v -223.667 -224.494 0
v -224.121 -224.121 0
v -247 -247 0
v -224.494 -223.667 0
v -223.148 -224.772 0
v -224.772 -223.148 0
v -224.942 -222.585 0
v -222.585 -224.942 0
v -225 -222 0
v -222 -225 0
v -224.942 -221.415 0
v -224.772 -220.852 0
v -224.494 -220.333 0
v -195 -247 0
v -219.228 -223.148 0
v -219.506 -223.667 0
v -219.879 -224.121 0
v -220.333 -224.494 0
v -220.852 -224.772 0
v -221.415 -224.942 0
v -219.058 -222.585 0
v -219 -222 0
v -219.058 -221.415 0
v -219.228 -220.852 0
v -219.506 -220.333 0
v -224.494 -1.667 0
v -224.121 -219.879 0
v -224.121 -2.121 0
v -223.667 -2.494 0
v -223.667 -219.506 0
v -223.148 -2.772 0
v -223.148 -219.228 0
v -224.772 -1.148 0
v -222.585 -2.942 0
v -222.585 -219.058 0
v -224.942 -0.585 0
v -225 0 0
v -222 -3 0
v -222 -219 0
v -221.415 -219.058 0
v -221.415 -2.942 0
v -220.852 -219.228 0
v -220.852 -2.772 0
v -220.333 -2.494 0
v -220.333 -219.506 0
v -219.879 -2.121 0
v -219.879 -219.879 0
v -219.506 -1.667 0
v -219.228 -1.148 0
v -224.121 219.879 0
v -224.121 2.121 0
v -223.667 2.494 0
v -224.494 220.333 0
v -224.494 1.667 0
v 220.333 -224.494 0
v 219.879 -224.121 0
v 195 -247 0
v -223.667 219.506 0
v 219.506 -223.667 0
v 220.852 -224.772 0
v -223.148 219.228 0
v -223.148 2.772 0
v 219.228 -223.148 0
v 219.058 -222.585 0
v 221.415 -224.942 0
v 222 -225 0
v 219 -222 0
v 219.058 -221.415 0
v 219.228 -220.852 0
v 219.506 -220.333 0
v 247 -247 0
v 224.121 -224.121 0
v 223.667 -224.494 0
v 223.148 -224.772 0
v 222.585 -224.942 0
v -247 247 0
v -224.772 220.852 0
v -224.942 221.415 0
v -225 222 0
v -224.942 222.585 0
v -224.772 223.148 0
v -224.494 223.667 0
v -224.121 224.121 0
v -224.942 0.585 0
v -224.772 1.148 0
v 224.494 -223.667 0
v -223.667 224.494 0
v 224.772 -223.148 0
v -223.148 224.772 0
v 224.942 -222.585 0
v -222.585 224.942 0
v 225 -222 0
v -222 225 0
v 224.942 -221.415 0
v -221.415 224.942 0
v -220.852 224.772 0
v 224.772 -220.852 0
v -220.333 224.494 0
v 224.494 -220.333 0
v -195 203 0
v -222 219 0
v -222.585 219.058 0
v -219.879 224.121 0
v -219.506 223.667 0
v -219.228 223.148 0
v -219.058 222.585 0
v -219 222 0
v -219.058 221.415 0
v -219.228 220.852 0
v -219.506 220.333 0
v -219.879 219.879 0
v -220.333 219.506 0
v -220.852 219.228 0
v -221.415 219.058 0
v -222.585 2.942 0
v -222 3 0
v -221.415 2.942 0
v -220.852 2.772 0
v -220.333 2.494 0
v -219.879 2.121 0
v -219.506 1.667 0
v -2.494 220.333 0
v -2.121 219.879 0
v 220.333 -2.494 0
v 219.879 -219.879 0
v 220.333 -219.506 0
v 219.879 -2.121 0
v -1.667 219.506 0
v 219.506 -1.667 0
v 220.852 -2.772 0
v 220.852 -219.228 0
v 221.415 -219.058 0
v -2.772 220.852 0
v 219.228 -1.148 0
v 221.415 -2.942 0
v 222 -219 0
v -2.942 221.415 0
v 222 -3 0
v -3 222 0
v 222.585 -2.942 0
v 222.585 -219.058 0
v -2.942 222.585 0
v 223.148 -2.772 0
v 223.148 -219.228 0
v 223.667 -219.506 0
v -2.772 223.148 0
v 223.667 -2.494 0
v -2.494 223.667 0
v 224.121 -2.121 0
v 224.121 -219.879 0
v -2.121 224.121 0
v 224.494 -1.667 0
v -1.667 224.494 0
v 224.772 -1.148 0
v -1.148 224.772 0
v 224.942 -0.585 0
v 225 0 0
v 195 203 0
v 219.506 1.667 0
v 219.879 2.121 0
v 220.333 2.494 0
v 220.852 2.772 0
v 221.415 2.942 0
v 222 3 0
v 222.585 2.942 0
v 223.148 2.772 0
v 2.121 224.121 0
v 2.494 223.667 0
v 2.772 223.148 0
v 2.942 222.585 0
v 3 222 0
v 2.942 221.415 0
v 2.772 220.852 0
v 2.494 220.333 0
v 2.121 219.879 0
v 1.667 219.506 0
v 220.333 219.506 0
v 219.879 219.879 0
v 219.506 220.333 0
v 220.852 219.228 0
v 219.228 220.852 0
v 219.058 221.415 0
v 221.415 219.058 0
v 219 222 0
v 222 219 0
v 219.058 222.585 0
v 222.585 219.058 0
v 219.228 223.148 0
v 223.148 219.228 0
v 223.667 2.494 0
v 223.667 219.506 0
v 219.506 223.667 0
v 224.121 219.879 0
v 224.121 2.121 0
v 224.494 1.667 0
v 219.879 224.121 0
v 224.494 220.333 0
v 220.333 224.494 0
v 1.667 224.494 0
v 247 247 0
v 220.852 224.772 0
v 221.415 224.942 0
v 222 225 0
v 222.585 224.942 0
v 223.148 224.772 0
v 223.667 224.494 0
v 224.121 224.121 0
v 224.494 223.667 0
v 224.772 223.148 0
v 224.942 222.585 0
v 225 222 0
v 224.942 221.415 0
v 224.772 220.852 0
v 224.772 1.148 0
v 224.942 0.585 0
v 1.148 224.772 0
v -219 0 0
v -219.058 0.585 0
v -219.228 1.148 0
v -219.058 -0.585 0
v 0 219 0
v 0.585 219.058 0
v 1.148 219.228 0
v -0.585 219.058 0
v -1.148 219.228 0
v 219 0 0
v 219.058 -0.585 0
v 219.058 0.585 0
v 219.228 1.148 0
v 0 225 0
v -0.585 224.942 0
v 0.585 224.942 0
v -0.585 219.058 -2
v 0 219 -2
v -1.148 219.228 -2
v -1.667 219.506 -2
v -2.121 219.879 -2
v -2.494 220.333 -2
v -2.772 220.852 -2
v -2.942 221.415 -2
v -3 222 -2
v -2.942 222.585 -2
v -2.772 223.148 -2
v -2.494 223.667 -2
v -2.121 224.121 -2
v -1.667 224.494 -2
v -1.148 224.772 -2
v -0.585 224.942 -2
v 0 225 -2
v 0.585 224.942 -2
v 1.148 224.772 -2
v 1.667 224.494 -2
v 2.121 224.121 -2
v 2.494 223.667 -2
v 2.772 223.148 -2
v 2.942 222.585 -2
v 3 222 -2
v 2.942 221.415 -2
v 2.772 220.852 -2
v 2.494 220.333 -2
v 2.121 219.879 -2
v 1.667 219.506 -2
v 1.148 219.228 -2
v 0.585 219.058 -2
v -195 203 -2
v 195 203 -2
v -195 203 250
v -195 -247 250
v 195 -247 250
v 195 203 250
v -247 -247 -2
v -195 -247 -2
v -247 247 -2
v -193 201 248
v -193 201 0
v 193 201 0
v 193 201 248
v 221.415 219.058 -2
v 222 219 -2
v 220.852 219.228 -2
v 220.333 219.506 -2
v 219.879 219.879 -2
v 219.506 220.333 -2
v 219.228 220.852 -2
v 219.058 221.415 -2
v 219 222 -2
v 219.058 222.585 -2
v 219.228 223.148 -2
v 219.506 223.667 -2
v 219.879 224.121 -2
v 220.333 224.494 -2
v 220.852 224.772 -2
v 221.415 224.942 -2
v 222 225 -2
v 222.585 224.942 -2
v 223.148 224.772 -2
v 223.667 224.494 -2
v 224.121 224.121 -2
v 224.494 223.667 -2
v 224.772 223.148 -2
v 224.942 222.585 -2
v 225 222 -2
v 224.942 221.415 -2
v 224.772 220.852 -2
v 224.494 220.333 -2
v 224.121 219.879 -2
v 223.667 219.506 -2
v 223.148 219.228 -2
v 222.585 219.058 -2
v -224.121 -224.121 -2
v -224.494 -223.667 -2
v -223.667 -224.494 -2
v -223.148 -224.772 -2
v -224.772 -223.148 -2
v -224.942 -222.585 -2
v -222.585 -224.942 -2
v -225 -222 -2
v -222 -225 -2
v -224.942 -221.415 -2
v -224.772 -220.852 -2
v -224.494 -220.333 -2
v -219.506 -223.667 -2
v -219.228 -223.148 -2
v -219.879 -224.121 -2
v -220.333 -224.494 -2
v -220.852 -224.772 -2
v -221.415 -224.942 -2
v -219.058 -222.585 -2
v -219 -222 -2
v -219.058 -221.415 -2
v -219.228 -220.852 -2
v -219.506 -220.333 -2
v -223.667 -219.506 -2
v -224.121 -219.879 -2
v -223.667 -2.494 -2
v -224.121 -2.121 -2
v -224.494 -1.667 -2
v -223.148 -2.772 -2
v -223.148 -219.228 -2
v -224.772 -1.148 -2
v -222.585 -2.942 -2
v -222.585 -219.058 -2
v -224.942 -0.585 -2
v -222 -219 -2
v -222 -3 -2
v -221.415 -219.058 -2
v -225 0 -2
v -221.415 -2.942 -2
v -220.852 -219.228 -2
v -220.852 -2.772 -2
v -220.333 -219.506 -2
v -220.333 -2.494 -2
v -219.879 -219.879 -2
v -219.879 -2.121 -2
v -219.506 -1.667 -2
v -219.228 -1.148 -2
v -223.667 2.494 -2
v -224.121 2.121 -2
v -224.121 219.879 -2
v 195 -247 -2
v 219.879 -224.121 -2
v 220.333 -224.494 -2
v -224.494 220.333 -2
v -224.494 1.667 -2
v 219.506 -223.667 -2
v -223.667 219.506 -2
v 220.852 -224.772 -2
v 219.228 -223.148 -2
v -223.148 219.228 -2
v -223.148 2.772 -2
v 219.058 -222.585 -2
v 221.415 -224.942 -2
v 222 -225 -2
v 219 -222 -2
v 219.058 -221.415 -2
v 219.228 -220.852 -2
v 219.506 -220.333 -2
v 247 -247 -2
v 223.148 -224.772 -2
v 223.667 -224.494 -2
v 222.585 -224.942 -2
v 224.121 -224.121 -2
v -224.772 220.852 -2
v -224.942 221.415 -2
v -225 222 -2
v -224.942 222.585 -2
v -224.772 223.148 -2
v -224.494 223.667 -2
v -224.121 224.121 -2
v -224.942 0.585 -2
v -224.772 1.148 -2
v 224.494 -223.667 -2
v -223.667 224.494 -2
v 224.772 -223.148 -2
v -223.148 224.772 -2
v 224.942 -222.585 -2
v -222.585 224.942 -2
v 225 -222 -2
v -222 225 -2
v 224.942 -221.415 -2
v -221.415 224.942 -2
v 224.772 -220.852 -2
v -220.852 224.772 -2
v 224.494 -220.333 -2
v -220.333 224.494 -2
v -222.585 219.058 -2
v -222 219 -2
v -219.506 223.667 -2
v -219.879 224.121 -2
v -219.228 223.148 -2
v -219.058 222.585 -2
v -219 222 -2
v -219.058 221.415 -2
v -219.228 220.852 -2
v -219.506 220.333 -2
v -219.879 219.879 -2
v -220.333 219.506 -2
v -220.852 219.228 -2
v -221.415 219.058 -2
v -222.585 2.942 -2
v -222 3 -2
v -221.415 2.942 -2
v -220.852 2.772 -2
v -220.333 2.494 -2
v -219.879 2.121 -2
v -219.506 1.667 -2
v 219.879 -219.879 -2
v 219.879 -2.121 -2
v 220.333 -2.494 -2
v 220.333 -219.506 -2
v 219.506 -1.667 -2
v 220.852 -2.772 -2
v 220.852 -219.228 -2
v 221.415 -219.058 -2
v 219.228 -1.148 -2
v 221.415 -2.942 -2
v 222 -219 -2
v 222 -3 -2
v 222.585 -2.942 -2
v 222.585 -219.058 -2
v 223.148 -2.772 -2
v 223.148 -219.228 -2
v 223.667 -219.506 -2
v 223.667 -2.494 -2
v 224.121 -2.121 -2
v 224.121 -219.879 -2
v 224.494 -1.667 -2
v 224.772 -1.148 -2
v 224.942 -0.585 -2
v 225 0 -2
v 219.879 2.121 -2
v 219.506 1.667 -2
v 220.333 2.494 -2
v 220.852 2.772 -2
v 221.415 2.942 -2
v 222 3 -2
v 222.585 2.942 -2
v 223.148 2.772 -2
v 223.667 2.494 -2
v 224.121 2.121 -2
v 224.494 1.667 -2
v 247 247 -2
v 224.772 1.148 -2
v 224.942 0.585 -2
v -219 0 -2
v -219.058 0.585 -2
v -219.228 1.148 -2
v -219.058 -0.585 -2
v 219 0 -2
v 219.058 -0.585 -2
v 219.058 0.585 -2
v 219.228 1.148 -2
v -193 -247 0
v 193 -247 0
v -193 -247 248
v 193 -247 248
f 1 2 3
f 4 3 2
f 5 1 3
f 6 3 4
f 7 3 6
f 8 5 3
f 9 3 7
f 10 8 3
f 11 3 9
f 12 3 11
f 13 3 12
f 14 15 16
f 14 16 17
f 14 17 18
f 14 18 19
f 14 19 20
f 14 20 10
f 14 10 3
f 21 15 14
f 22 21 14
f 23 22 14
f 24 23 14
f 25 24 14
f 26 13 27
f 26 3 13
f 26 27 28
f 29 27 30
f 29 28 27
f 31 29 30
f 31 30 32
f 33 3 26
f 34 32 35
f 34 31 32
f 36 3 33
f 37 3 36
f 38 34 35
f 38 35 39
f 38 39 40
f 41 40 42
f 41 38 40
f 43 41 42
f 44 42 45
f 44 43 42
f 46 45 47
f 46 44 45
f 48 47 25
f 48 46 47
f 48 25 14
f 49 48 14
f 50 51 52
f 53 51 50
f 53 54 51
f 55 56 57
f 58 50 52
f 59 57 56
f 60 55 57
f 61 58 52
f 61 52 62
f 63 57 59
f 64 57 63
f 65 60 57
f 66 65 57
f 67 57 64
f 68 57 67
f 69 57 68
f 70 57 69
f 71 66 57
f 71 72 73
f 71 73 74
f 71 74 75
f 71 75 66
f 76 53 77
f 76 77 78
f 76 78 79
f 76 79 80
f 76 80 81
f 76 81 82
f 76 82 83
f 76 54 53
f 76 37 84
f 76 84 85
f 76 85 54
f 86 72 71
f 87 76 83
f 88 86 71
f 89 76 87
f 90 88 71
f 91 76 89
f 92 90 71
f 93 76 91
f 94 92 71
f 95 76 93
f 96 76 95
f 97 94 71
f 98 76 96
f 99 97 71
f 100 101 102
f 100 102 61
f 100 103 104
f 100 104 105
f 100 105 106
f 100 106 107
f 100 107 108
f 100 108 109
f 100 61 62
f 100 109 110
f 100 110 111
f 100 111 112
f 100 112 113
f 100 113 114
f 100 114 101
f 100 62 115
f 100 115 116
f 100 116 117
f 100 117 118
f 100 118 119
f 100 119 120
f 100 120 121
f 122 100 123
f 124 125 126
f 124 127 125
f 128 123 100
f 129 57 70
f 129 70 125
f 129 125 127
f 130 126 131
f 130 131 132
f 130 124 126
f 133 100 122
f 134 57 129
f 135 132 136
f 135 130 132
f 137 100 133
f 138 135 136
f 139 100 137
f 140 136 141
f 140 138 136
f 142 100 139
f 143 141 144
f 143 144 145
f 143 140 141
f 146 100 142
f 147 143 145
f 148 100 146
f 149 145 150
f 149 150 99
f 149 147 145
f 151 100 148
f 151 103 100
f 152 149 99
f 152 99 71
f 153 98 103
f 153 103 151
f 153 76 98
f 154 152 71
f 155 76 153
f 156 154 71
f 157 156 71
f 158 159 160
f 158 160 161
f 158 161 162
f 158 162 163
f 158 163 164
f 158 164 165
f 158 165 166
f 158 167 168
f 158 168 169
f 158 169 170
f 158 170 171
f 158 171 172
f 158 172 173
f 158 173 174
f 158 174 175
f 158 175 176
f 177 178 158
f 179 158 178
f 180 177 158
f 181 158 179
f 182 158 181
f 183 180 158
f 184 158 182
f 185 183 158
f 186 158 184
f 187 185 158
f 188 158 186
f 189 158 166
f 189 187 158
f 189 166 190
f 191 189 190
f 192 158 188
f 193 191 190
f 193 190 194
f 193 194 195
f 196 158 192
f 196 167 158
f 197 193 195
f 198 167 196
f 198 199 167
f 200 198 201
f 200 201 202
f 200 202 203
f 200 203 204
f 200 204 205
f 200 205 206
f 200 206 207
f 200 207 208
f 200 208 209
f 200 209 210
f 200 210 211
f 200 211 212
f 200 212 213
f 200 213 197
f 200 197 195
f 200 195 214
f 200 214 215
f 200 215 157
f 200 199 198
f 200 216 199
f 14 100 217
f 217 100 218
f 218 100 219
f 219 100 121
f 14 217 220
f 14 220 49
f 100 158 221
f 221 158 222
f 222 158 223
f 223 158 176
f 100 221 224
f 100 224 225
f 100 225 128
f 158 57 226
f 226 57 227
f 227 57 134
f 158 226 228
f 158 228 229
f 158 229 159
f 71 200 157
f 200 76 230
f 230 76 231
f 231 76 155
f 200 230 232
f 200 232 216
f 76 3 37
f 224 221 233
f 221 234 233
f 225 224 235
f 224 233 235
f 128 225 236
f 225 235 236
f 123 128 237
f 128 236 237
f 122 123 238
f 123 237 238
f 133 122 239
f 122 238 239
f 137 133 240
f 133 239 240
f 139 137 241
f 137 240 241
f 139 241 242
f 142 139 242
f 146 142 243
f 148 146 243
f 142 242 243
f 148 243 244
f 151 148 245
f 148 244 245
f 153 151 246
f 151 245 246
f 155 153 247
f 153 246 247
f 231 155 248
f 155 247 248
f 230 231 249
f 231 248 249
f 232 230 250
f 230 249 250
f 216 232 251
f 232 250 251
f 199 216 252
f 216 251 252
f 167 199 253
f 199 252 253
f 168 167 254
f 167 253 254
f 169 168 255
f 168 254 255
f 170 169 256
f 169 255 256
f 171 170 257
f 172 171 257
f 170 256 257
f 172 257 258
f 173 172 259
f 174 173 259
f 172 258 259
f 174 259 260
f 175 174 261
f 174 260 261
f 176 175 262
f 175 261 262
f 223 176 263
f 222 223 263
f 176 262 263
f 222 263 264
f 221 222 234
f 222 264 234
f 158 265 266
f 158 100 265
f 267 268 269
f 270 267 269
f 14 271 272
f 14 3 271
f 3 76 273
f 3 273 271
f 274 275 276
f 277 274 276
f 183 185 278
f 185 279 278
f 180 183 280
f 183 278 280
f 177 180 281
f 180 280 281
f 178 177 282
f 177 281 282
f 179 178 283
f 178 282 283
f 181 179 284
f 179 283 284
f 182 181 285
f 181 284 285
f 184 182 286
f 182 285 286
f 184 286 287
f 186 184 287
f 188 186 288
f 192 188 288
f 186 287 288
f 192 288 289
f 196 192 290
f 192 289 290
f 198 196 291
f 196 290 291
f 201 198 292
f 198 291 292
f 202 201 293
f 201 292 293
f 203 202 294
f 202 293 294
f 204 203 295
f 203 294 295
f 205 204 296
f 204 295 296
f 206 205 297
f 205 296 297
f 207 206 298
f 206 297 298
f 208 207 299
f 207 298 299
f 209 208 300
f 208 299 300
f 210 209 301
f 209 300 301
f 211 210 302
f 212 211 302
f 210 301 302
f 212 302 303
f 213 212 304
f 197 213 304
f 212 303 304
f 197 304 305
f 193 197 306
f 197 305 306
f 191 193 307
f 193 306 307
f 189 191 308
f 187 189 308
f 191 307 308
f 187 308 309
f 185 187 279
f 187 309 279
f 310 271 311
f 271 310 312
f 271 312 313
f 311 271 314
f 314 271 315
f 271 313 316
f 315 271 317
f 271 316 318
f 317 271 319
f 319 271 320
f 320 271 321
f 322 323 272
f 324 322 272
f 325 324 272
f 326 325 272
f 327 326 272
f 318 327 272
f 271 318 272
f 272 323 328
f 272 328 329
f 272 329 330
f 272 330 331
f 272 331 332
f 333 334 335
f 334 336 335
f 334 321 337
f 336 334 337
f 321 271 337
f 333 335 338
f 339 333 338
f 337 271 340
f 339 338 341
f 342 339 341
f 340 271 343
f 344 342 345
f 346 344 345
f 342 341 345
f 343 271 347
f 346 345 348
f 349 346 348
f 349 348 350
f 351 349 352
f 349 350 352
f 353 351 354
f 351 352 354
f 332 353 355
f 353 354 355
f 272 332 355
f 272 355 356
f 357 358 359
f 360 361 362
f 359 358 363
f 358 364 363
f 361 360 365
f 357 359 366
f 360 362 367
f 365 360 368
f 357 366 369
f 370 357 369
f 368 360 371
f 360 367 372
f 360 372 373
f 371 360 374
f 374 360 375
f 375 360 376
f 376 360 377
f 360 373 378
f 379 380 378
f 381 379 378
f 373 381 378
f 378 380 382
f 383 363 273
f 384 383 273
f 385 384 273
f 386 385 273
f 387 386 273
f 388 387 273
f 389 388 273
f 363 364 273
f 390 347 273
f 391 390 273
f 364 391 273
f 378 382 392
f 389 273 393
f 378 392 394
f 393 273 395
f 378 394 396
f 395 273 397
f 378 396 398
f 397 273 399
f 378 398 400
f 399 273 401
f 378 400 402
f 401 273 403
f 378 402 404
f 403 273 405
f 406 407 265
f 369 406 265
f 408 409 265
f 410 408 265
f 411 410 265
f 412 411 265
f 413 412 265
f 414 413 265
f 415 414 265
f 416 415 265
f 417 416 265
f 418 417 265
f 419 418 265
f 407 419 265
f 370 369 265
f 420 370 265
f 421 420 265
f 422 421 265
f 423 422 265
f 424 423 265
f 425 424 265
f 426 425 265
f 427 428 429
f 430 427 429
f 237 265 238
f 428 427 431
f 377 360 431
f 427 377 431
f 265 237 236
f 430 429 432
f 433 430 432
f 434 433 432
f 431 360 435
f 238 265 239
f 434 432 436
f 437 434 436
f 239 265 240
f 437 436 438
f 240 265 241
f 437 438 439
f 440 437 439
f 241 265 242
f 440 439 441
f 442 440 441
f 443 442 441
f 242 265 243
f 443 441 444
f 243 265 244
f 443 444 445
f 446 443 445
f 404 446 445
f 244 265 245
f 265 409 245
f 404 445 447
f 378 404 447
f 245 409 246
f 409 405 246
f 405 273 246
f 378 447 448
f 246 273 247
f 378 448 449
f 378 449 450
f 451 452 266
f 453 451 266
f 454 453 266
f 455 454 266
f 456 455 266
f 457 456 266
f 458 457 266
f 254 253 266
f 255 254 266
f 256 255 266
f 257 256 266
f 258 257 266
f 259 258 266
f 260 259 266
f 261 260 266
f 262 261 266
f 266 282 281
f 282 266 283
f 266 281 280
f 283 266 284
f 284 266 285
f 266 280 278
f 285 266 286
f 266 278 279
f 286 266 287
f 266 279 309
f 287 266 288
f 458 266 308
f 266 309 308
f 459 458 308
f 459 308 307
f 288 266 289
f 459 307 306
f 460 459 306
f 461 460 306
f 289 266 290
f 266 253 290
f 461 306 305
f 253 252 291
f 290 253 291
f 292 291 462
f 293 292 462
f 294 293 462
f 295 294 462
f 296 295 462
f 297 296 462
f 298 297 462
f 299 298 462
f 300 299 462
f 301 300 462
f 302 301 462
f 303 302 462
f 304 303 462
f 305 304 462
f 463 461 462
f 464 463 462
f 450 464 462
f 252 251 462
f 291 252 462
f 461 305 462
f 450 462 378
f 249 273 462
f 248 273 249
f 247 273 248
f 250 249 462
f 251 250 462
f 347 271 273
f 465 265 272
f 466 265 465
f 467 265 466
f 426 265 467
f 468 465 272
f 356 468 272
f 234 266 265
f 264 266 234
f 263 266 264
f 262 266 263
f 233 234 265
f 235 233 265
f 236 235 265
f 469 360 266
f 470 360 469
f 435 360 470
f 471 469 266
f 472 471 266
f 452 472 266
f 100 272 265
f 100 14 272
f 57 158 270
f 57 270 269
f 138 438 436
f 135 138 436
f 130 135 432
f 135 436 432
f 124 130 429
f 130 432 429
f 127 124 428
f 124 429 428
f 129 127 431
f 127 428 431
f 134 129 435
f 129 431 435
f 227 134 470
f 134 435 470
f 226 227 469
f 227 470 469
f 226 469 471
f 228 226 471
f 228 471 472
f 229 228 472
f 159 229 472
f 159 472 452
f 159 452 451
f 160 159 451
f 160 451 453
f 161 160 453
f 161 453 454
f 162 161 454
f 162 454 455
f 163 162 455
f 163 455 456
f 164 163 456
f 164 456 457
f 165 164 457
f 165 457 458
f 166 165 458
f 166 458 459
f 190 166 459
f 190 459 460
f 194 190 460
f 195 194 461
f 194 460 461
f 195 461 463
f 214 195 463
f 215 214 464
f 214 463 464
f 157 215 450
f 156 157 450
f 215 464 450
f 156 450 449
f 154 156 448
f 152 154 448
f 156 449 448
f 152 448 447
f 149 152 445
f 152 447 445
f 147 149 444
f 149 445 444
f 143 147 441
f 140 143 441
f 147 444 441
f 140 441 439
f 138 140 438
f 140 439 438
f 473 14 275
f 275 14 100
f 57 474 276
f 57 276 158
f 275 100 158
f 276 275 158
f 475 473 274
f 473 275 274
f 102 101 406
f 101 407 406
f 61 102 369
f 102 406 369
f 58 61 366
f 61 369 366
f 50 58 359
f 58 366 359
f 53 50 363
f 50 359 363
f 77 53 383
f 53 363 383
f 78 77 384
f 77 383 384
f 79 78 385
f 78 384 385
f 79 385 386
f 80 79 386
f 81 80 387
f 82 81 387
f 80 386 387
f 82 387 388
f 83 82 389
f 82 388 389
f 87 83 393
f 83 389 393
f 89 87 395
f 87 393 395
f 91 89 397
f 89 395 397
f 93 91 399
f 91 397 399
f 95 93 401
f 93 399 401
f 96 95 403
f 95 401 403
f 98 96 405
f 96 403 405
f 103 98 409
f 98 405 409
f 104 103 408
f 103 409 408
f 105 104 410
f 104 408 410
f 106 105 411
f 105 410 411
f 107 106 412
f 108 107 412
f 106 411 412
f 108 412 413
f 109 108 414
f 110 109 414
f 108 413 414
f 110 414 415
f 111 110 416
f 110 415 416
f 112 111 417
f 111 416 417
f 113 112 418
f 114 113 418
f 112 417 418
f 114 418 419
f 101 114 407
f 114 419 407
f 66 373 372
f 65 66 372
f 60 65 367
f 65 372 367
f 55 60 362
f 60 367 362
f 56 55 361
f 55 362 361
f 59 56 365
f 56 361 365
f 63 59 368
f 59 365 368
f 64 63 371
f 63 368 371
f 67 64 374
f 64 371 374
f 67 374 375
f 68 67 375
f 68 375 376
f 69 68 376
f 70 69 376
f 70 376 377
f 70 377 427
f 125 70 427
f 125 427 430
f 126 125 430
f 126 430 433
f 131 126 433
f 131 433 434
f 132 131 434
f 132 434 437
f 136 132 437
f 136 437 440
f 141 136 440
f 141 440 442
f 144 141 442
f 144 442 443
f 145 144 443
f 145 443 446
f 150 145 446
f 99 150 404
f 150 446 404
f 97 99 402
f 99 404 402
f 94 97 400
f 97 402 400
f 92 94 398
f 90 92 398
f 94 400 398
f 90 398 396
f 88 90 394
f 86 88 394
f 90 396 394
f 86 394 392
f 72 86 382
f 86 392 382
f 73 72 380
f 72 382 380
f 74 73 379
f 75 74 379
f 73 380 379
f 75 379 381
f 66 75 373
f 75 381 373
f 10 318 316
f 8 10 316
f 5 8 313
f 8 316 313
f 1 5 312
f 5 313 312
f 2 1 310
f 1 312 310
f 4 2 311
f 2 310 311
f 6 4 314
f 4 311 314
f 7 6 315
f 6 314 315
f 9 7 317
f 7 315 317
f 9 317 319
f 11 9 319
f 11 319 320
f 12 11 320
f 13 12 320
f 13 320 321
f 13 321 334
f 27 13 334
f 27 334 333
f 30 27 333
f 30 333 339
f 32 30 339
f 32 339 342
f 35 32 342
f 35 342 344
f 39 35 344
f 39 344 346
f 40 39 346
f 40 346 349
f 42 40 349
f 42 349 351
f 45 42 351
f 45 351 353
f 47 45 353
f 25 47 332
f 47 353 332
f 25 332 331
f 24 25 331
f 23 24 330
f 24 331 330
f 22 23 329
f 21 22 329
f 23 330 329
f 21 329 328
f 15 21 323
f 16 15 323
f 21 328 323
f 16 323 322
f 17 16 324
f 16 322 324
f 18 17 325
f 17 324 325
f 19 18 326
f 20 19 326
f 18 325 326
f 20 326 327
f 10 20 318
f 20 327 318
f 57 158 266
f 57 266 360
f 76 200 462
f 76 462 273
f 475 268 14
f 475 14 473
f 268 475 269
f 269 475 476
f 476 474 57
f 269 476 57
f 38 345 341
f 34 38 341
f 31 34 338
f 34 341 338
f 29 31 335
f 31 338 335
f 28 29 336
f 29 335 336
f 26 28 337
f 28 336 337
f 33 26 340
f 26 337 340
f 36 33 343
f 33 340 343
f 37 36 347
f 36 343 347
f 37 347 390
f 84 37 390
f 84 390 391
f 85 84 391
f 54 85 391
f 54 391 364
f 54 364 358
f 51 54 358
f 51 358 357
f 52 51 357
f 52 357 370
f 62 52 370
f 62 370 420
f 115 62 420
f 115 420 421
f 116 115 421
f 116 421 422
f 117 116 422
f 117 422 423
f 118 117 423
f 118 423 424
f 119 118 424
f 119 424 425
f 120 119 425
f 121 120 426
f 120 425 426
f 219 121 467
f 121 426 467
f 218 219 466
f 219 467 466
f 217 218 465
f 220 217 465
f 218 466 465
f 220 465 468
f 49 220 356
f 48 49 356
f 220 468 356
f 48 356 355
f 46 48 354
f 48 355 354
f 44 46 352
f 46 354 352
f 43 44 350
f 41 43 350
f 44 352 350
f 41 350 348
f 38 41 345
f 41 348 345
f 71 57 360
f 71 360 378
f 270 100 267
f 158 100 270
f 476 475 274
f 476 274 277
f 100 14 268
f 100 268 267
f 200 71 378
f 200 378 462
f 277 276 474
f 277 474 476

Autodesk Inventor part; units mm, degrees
ref_plane "YZ Plane" through (0, 0, 0) normal (1, 0, 0) x (0, 1, 0)
ref_plane "XZ Plane" through (0, 0, 0) normal (0, 1, 0) x (-1, 0, 0)
ref_plane "XY Plane" through (0, 0, 0) normal (0, 0, 1) x (1, 0, 0)
sketch "Sketch1" plane through (0, 0, 0) normal (0, 0, 1) x (1, 0, 0)
  line L0 (-247, -247) -> (247, -247)
  line L1 (247, -247) -> (247, 247)
  line L2 (247, 247) -> (-247, 247)
  line L3 (-247, 247) -> (-247, -247)
  line L4 (-247, -247) -> (247, 247) construction
  line L5 (247, -247) -> (-247, 247) construction
  line L6 (-195, -247) -> (-195, 203)
  line L7 (-195, 203) -> (195, 203)
  line L8 (195, 203) -> (195, -247)
  line L9 (195, -247) -> (-195, -247)
  line L10 (0, 247) -> (0, -247) construction
  point P0 (0, 0)
  dimension "d0" = 494
  dimension "d1" = 494
  dimension "d4" = 390
  dimension "d5" = 450
extrude "Extrusion2" add sketch "Sketch1" along normal blind 250 contours L6 L7 L8 L0
shell "Shell2" thickness 2 removed faces 1 at (65, -97, 0)
extrude "Extrusion3" add sketch "Sketch1" against normal blind 2 contours L3 L2 L1 L0 L8 L7 L6
hole "Hole1" at (-222, 222, 0) direction (0, 0, -1) diameter 6 end through all
pattern_linear "Rectangular Pattern1" count 3 spacing 222 along (1, 0, 0) count 3 spacing 222 along (0, -1, 0) of "Hole1"
sketch "Sketch2" plane through (-193, -245, 0) normal (0, 1, 0) x (1, 0, 0)
  line L0 (0, 0) -> (386, 0) projected
  line L1 (0, 0) -> (0, -248) projected
  line L2 (0, -248) -> (386, -248) projected
  line L3 (386, 0) -> (386, -248) projected
  point P0 (193, 0)
extrude "Extrusion4" cut sketch "Sketch2" against normal up to next
properties part number "SidePanelCover"
